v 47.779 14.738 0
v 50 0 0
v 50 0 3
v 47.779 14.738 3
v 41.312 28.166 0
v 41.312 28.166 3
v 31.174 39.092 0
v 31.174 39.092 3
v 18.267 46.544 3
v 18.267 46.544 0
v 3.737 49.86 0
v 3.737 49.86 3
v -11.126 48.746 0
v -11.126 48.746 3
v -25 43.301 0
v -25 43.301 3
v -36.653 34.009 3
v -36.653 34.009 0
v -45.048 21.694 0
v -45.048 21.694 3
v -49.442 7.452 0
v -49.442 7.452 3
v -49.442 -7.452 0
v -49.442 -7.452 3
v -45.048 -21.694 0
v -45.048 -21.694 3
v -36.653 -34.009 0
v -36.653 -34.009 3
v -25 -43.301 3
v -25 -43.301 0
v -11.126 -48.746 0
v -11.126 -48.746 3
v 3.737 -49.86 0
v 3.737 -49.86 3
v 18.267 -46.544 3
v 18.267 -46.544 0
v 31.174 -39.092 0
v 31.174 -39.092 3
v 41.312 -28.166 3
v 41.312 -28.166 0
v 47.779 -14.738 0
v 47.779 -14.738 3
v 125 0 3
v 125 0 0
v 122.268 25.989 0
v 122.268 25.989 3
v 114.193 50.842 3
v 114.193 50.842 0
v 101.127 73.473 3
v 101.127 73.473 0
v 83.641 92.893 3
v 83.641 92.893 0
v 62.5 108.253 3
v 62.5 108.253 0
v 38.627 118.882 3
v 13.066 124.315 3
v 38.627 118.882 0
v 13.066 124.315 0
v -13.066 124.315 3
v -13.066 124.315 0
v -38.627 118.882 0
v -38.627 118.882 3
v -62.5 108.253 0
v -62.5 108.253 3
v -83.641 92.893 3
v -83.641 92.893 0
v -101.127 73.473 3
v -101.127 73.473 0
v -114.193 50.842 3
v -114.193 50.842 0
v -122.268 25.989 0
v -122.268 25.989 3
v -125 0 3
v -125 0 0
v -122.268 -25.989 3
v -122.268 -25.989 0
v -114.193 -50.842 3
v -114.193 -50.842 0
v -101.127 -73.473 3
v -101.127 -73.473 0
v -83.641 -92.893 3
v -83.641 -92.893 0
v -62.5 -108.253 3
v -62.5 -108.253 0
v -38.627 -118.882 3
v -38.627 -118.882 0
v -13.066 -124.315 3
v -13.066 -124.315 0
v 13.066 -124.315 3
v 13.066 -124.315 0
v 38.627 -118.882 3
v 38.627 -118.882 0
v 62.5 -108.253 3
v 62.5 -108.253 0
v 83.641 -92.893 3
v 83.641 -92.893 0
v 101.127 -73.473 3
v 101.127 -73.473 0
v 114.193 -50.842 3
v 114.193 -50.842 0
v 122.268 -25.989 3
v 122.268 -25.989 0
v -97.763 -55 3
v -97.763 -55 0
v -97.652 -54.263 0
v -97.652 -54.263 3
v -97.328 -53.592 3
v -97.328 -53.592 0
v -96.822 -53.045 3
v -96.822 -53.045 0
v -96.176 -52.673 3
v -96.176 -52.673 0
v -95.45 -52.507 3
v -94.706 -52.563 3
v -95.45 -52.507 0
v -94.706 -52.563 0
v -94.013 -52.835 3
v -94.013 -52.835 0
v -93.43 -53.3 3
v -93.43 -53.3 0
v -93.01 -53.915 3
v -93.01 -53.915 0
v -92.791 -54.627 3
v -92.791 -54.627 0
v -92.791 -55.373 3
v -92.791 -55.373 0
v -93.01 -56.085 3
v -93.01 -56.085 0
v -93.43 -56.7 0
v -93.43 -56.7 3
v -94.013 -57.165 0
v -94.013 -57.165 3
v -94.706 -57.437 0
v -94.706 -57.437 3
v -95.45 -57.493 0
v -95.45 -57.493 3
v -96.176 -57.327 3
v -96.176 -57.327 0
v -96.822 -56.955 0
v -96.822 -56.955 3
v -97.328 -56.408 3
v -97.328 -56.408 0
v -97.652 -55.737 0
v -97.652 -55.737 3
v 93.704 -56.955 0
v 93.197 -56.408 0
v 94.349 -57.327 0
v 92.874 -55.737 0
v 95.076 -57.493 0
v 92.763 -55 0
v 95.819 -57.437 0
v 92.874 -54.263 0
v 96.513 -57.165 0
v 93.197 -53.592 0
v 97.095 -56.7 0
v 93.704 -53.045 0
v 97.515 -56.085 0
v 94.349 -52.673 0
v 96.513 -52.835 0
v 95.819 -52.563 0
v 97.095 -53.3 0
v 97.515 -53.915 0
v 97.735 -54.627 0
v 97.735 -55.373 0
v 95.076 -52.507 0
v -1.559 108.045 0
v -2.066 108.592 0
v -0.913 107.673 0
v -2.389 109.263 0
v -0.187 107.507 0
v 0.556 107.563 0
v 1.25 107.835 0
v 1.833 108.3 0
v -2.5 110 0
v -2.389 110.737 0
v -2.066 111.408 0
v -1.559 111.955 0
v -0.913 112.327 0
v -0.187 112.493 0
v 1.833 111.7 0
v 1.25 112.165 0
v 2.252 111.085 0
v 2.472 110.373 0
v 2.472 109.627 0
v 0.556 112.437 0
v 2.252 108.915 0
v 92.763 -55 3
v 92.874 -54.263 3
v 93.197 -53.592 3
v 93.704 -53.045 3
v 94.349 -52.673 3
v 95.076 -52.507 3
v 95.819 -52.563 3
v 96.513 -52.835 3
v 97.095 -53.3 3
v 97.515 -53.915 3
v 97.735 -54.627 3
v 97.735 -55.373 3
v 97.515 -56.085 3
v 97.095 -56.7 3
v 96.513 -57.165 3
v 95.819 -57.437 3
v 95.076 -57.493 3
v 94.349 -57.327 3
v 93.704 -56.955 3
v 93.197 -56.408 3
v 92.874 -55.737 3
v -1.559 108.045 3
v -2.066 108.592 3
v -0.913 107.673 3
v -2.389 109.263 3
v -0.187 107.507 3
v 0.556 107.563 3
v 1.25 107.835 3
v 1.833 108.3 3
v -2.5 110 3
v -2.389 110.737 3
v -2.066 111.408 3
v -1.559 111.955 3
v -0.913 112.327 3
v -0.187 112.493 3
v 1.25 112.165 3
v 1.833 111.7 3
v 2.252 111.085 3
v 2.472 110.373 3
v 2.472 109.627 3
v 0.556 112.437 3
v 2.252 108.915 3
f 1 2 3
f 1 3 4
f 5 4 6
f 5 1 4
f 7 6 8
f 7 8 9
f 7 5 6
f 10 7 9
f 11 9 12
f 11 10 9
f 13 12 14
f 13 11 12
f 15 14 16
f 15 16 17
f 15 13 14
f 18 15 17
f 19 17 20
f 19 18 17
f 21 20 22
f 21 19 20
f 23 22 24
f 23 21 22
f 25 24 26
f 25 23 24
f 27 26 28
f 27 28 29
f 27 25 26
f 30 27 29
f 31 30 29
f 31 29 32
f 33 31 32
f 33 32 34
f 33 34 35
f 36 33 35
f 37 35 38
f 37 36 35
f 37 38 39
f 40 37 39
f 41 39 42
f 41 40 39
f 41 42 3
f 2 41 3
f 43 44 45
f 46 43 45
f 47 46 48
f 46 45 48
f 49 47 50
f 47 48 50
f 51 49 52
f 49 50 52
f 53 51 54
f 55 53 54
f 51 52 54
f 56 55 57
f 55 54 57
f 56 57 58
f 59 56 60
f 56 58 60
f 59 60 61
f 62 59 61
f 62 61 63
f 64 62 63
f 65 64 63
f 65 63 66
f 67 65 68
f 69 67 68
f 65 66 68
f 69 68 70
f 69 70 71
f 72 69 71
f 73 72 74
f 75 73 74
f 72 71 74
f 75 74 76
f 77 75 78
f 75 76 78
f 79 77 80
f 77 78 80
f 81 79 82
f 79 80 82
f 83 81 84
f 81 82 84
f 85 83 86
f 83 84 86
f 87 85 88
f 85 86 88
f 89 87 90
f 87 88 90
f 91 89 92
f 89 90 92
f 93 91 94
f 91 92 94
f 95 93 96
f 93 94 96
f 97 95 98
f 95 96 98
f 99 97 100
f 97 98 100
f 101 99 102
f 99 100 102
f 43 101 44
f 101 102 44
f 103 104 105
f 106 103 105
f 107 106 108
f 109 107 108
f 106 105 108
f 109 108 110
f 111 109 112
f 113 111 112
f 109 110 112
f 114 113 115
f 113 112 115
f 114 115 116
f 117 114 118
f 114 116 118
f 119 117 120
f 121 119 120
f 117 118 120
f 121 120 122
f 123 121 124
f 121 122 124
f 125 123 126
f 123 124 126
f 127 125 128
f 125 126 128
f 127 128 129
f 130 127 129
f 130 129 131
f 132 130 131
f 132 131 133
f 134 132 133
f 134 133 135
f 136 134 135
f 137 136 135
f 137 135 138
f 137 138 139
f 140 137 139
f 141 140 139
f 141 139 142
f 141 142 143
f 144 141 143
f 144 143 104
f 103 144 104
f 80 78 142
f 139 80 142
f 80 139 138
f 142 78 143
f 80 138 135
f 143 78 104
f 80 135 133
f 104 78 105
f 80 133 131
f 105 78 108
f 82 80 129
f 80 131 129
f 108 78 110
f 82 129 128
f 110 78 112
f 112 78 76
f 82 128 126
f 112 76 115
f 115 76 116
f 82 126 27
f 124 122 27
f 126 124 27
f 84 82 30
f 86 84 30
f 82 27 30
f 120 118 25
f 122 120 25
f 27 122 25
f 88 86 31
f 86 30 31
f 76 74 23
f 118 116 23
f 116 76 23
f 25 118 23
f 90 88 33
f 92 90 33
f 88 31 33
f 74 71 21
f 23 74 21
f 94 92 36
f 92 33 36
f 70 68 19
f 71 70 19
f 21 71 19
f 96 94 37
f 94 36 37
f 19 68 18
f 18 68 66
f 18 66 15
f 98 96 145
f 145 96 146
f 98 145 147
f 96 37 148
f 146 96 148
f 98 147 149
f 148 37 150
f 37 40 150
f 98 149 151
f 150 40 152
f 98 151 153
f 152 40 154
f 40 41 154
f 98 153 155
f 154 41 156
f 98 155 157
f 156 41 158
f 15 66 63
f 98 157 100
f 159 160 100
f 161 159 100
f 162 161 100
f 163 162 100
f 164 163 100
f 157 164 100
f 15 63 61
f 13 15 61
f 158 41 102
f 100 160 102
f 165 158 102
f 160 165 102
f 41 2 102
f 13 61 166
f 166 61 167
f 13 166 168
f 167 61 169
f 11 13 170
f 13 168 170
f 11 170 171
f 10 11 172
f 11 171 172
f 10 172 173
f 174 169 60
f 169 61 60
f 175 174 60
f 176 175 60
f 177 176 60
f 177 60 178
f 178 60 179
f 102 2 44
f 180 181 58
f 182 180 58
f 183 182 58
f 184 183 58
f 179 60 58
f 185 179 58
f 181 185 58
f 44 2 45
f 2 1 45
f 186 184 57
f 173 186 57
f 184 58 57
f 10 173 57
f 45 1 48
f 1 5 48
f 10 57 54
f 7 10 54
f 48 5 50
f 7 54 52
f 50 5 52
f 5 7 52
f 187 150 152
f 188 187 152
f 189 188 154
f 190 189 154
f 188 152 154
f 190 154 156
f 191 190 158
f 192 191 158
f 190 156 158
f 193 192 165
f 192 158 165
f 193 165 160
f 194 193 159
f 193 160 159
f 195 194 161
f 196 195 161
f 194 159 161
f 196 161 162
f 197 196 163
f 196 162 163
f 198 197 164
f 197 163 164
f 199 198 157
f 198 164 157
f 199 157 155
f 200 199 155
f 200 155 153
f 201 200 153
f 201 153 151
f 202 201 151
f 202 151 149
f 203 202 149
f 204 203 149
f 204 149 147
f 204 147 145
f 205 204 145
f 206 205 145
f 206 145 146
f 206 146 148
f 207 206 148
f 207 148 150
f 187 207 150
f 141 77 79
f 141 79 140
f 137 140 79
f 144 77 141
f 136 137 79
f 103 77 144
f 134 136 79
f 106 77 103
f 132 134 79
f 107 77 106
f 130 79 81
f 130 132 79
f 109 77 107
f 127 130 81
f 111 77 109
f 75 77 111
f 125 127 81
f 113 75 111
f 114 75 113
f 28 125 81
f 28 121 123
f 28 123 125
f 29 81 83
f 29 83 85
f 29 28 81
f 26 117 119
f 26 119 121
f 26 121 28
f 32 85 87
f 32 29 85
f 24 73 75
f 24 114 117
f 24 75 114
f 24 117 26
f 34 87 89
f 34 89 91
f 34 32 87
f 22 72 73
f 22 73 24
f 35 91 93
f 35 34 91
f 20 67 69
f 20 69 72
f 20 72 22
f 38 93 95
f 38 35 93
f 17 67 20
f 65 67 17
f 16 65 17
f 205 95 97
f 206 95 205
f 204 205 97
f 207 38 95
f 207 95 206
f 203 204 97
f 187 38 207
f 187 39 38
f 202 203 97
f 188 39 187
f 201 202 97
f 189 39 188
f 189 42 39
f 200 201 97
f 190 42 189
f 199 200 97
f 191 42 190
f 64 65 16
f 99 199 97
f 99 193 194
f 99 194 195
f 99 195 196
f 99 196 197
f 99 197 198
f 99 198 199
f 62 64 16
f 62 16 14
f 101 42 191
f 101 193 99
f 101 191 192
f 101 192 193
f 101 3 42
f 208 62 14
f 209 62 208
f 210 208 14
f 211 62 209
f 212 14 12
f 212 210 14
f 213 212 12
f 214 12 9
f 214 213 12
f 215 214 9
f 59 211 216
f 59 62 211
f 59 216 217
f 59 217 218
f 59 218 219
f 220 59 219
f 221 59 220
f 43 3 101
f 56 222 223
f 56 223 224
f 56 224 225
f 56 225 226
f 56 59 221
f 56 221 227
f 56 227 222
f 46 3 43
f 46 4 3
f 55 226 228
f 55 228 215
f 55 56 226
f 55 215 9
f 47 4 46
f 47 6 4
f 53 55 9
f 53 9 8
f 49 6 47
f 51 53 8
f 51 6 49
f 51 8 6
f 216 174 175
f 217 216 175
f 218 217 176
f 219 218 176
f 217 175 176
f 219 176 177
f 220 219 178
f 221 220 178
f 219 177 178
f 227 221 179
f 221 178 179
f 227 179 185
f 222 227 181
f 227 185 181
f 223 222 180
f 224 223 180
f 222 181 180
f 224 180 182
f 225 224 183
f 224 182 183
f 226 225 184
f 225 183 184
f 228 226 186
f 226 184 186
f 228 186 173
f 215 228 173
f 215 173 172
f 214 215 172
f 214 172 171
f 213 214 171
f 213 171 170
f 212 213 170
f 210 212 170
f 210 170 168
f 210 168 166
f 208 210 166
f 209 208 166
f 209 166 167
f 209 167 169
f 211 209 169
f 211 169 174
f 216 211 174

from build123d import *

# Parameters (mm, degrees)
F0_R     = 125
F0_R_2   = 50
F1_DEPTH = 3
F3_D     = 5


with BuildPart() as f1:
    # F0 (on Top) → F1 (new body)
    with BuildSketch(Plane.XY):
        Circle(F0_R)
        Circle(F0_R_2, mode=Mode.SUBTRACT)
    extrude(amount=F1_DEPTH)

    # F3 (through all)
    with Locations(Plane.XY.offset(3)):
        with Locations((0, 110), (95.262794, -55), (-95.262794, -55)):
            Hole(F3_D / 2)


solid = f1.part
